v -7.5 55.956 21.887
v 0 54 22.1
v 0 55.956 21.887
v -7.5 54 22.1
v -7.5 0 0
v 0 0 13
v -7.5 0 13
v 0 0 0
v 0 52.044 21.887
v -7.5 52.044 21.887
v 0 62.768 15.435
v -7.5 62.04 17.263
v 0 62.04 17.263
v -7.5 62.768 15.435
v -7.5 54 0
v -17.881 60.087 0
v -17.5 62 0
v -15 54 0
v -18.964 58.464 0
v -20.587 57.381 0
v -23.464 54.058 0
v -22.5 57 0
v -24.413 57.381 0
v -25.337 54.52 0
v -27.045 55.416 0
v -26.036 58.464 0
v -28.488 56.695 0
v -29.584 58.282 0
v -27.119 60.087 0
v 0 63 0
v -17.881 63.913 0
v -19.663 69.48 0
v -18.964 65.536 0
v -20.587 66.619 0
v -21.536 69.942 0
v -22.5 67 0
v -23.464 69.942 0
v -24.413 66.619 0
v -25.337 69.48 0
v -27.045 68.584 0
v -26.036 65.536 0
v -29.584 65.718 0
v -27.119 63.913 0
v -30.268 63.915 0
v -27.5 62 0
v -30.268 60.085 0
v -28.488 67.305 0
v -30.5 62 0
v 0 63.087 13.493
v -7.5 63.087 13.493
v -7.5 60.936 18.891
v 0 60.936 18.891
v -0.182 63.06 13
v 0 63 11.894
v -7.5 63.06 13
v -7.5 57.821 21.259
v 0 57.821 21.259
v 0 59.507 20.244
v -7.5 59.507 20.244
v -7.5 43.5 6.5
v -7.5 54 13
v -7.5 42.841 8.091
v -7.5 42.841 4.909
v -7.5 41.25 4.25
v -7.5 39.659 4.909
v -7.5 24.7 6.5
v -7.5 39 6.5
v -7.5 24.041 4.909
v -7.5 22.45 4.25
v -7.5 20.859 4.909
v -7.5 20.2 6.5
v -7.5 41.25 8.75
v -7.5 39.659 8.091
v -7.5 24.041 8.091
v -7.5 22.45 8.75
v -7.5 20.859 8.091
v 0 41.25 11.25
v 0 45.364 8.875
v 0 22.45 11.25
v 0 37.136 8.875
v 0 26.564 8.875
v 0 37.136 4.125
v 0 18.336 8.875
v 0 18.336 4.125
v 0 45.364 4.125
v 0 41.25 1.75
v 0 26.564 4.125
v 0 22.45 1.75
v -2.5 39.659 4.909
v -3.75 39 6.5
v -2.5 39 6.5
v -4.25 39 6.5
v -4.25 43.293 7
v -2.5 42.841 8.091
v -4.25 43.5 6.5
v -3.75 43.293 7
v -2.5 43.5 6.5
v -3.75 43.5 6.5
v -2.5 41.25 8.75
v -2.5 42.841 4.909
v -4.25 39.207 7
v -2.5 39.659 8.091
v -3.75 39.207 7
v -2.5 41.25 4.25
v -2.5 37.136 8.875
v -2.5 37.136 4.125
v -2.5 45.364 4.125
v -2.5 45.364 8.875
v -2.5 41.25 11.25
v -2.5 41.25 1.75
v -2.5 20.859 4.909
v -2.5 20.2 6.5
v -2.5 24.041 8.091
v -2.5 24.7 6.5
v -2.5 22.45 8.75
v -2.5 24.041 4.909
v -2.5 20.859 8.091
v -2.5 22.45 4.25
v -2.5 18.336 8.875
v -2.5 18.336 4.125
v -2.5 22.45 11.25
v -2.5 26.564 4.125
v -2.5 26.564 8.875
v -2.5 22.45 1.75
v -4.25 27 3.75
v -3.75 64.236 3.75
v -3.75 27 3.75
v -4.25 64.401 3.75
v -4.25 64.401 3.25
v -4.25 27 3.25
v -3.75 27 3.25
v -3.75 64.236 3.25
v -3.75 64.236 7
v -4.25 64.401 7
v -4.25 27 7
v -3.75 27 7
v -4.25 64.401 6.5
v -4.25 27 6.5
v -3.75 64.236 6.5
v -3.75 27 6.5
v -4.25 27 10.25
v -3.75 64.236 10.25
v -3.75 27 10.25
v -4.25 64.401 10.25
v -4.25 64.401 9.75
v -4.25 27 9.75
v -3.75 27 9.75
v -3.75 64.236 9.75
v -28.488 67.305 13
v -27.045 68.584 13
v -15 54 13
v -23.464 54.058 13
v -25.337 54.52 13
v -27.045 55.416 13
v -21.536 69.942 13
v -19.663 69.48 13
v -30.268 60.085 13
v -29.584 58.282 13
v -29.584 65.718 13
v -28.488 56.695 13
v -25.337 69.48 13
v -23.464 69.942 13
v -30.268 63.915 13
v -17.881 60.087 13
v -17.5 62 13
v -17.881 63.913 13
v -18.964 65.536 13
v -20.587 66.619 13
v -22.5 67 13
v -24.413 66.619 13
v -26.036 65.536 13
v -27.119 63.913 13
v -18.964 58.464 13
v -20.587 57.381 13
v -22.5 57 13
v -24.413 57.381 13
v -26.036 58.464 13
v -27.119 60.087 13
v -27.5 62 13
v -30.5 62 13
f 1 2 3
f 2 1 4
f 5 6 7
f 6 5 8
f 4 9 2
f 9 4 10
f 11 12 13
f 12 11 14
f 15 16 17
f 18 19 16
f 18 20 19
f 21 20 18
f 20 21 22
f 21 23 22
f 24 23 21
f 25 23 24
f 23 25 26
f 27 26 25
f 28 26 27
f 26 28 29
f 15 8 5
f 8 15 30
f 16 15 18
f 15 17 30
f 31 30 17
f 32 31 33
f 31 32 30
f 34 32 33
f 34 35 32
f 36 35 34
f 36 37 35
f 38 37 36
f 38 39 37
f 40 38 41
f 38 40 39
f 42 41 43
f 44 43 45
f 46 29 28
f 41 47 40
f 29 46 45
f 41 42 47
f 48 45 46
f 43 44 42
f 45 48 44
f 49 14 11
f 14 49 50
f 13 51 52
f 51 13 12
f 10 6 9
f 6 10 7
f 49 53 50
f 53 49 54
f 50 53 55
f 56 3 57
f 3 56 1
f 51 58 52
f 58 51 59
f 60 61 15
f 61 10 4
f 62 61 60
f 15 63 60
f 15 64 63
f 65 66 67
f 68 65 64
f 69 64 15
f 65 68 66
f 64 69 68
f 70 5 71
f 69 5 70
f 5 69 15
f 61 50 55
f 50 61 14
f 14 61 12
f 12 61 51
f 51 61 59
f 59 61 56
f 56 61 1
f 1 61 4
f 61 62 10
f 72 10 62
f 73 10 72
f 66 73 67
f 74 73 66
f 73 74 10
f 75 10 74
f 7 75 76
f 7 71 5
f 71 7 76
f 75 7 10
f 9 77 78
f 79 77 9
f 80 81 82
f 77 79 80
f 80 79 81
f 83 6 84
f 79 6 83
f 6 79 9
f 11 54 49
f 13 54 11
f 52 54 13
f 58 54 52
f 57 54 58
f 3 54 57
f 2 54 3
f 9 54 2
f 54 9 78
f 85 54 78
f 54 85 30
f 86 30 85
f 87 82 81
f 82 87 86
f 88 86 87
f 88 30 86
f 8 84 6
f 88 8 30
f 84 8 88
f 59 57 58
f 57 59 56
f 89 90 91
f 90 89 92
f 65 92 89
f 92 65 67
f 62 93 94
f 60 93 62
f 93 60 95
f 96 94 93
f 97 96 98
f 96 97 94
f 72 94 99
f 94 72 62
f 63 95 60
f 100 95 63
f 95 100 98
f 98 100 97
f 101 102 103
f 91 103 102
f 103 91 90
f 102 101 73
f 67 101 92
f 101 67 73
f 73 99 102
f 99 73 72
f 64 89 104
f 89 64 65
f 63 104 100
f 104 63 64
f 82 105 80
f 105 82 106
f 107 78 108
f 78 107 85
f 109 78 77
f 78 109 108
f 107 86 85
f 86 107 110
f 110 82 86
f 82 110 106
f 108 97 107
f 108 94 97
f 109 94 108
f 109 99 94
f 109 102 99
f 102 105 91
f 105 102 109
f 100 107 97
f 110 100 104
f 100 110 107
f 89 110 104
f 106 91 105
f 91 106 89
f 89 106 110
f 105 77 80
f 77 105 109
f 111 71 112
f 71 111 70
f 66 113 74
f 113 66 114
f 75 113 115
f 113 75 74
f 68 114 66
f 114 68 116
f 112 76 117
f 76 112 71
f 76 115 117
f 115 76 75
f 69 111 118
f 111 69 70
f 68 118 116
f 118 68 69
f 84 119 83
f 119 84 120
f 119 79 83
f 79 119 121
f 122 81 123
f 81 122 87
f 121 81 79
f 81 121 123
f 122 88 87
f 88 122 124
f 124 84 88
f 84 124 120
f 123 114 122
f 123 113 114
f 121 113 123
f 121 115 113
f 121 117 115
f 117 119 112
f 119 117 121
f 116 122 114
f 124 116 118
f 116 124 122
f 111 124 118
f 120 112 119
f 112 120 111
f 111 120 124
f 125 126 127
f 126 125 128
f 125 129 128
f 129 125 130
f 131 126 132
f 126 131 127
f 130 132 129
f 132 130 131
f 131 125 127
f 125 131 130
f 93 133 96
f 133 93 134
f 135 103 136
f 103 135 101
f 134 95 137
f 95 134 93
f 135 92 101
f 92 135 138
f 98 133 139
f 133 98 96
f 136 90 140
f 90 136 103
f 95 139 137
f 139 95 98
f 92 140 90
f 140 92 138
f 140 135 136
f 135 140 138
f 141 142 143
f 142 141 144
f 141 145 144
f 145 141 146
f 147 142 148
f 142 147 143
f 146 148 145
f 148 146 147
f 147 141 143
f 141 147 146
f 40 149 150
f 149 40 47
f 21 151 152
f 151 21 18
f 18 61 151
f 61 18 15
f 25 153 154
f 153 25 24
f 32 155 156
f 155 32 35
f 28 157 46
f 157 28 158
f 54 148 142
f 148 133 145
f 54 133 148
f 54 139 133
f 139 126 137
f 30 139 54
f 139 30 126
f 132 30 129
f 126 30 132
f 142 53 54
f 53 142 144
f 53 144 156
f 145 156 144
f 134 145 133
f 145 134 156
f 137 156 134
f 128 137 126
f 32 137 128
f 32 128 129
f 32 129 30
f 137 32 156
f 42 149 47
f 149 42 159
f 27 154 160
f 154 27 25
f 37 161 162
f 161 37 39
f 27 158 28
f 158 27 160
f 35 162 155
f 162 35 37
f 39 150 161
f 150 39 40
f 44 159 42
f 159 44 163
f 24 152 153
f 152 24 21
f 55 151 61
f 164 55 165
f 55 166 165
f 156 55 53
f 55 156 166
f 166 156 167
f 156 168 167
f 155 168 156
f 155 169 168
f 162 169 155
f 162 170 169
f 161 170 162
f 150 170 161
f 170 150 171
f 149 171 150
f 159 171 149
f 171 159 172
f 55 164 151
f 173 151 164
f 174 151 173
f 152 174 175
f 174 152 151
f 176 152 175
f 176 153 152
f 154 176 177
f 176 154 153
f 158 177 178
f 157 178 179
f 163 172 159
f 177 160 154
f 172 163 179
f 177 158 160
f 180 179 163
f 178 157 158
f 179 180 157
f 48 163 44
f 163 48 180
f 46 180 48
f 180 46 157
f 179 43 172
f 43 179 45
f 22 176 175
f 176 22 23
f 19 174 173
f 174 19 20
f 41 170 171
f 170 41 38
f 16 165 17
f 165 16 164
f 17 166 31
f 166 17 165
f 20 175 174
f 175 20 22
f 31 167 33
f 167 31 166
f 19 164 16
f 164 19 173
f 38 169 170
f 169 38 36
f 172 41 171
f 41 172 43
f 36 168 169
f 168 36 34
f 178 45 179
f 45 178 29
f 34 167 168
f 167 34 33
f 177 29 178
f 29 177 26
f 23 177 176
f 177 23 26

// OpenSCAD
// Lower Toilet Seat Hinge Bracket
// Designed by Mike Creuzer Dec 30 2012 -  thingiverse@creuzer.com

// measurements are as the part is in use using the bottom back edge of the seat as reference for all measurements
// rotated on its side for printing when done

//Bracket bit

BracketWidth = 13; 
BracketLength = 54; 
BracketHeight = 7.5;

// Hinge upright bit to center of hinge hole
HingeWidth = BracketWidth; 
HingeLength = 9; 
HingeHeight = 15;

// Hinge Hole
//Radius
HingeHoleRadius = 5;
HingeHoleWallThickness = 3;
// Smaller number is smoother circle & slower rendering
HingeHoleRoundness = 0.01; 

//Mounting Holes
// diameter
MountingHoleSize = 4.5; 
// diameter
MountingHoleScrewHeadSize = 9.5; 
MountingHoleScrewHeadthickness = 2.5; 
FirstMountingHole = 12.75;
DistanceBetweenMountingHole =  18.8;
// smaller is more round. 6 ought to give you a pentagon
ScrewHeadRoundness = 5; 
// smaller is more round. 6 ought to give you a pentagon
ScrewRoundness = 2; 




rotate(a=[0,-90,0]){ // Rotate to the -90 so the low poly count circles put the angles up for easier printing.



// Make the mounting leg
difference(){
	hull(){
	cube(size = [BracketWidth,BracketLength,BracketHeight], center = false);
// Make a reinforcement...
translate(v = [BracketWidth , BracketLength , 0]) cylinder(h=BracketHeight, r=BracketWidth *.7, $fs=ScrewRoundness);
	}

	// first hole
	translate(v = [BracketWidth * .5, BracketLength - FirstMountingHole, 0]) cylinder(h=BracketHeight, r=MountingHoleSize/2, $fs=ScrewRoundness);
	translate(v = [BracketWidth * .5, BracketLength - FirstMountingHole, 0]) cylinder(h=MountingHoleScrewHeadthickness, r = MountingHoleScrewHeadSize/2, $fs=ScrewHeadRoundness);
	// second hole
	translate(v = [BracketWidth * .5, BracketLength - FirstMountingHole - DistanceBetweenMountingHole, 0]) cylinder(h=BracketHeight, r=MountingHoleSize/2, $fs=ScrewRoundness);
	translate(v = [BracketWidth * .5, BracketLength - FirstMountingHole - DistanceBetweenMountingHole, 0]) cylinder(h=MountingHoleScrewHeadthickness, r = MountingHoleScrewHeadSize/2, $fs=ScrewHeadRoundness);

	// pin holes for strength
	translate(v = [BracketWidth * .25, BracketLength * .5, BracketHeight * .5]) cube(size = [.5,BracketLength,.5], center = false);
	translate(v = [BracketWidth * .5, BracketLength * .5, BracketHeight * .5]) cube(size = [.5,BracketLength,.5], center = false);
	translate(v = [BracketWidth * .75, BracketLength * .5, BracketHeight * .5]) cube(size = [.5,BracketLength,.5], center = false);
}

// Make the hinge bit
difference() { // Make the hinge bracket, then minus the hole
	hull(){ // Make the hinge bracket all fancy looking
		translate(v = [0, BracketLength, 0]) cube(size = [HingeWidth,HingeLength,HingeHeight], center = false); // The support post
		translate(v = [0, BracketLength +HingeHoleRadius + HingeHoleWallThickness, HingeHeight +BracketHeight]) rotate(a=[0,90,0]) cylinder(h = BracketWidth, r=HingeHoleRadius + HingeHoleWallThickness, center = false, $fa=HingeHoleRoundness); // The round hinge bit
	}

	// The Hinge Hole
	translate(v = [-1, BracketLength +HingeHoleRadius + HingeHoleWallThickness, HingeHeight  + BracketHeight]) rotate(a=[0,90,0]) cylinder(h = BracketWidth*2, r=HingeHoleRadius, center = false, $fa=HingeHoleRoundness); 

	// pin holes for strength
	translate(v = [BracketWidth * .25, BracketLength * .5, BracketHeight * .5]) cube(size = [.5,BracketLength,.5], center = false);
	translate(v = [BracketWidth * .5, BracketLength * .5, BracketHeight * .5]) cube(size = [.5,BracketLength,.5], center = false);
	translate(v = [BracketWidth * .75, BracketLength * .5, BracketHeight * .5]) cube(size = [.5,BracketLength,.5], center = false);
}

}
